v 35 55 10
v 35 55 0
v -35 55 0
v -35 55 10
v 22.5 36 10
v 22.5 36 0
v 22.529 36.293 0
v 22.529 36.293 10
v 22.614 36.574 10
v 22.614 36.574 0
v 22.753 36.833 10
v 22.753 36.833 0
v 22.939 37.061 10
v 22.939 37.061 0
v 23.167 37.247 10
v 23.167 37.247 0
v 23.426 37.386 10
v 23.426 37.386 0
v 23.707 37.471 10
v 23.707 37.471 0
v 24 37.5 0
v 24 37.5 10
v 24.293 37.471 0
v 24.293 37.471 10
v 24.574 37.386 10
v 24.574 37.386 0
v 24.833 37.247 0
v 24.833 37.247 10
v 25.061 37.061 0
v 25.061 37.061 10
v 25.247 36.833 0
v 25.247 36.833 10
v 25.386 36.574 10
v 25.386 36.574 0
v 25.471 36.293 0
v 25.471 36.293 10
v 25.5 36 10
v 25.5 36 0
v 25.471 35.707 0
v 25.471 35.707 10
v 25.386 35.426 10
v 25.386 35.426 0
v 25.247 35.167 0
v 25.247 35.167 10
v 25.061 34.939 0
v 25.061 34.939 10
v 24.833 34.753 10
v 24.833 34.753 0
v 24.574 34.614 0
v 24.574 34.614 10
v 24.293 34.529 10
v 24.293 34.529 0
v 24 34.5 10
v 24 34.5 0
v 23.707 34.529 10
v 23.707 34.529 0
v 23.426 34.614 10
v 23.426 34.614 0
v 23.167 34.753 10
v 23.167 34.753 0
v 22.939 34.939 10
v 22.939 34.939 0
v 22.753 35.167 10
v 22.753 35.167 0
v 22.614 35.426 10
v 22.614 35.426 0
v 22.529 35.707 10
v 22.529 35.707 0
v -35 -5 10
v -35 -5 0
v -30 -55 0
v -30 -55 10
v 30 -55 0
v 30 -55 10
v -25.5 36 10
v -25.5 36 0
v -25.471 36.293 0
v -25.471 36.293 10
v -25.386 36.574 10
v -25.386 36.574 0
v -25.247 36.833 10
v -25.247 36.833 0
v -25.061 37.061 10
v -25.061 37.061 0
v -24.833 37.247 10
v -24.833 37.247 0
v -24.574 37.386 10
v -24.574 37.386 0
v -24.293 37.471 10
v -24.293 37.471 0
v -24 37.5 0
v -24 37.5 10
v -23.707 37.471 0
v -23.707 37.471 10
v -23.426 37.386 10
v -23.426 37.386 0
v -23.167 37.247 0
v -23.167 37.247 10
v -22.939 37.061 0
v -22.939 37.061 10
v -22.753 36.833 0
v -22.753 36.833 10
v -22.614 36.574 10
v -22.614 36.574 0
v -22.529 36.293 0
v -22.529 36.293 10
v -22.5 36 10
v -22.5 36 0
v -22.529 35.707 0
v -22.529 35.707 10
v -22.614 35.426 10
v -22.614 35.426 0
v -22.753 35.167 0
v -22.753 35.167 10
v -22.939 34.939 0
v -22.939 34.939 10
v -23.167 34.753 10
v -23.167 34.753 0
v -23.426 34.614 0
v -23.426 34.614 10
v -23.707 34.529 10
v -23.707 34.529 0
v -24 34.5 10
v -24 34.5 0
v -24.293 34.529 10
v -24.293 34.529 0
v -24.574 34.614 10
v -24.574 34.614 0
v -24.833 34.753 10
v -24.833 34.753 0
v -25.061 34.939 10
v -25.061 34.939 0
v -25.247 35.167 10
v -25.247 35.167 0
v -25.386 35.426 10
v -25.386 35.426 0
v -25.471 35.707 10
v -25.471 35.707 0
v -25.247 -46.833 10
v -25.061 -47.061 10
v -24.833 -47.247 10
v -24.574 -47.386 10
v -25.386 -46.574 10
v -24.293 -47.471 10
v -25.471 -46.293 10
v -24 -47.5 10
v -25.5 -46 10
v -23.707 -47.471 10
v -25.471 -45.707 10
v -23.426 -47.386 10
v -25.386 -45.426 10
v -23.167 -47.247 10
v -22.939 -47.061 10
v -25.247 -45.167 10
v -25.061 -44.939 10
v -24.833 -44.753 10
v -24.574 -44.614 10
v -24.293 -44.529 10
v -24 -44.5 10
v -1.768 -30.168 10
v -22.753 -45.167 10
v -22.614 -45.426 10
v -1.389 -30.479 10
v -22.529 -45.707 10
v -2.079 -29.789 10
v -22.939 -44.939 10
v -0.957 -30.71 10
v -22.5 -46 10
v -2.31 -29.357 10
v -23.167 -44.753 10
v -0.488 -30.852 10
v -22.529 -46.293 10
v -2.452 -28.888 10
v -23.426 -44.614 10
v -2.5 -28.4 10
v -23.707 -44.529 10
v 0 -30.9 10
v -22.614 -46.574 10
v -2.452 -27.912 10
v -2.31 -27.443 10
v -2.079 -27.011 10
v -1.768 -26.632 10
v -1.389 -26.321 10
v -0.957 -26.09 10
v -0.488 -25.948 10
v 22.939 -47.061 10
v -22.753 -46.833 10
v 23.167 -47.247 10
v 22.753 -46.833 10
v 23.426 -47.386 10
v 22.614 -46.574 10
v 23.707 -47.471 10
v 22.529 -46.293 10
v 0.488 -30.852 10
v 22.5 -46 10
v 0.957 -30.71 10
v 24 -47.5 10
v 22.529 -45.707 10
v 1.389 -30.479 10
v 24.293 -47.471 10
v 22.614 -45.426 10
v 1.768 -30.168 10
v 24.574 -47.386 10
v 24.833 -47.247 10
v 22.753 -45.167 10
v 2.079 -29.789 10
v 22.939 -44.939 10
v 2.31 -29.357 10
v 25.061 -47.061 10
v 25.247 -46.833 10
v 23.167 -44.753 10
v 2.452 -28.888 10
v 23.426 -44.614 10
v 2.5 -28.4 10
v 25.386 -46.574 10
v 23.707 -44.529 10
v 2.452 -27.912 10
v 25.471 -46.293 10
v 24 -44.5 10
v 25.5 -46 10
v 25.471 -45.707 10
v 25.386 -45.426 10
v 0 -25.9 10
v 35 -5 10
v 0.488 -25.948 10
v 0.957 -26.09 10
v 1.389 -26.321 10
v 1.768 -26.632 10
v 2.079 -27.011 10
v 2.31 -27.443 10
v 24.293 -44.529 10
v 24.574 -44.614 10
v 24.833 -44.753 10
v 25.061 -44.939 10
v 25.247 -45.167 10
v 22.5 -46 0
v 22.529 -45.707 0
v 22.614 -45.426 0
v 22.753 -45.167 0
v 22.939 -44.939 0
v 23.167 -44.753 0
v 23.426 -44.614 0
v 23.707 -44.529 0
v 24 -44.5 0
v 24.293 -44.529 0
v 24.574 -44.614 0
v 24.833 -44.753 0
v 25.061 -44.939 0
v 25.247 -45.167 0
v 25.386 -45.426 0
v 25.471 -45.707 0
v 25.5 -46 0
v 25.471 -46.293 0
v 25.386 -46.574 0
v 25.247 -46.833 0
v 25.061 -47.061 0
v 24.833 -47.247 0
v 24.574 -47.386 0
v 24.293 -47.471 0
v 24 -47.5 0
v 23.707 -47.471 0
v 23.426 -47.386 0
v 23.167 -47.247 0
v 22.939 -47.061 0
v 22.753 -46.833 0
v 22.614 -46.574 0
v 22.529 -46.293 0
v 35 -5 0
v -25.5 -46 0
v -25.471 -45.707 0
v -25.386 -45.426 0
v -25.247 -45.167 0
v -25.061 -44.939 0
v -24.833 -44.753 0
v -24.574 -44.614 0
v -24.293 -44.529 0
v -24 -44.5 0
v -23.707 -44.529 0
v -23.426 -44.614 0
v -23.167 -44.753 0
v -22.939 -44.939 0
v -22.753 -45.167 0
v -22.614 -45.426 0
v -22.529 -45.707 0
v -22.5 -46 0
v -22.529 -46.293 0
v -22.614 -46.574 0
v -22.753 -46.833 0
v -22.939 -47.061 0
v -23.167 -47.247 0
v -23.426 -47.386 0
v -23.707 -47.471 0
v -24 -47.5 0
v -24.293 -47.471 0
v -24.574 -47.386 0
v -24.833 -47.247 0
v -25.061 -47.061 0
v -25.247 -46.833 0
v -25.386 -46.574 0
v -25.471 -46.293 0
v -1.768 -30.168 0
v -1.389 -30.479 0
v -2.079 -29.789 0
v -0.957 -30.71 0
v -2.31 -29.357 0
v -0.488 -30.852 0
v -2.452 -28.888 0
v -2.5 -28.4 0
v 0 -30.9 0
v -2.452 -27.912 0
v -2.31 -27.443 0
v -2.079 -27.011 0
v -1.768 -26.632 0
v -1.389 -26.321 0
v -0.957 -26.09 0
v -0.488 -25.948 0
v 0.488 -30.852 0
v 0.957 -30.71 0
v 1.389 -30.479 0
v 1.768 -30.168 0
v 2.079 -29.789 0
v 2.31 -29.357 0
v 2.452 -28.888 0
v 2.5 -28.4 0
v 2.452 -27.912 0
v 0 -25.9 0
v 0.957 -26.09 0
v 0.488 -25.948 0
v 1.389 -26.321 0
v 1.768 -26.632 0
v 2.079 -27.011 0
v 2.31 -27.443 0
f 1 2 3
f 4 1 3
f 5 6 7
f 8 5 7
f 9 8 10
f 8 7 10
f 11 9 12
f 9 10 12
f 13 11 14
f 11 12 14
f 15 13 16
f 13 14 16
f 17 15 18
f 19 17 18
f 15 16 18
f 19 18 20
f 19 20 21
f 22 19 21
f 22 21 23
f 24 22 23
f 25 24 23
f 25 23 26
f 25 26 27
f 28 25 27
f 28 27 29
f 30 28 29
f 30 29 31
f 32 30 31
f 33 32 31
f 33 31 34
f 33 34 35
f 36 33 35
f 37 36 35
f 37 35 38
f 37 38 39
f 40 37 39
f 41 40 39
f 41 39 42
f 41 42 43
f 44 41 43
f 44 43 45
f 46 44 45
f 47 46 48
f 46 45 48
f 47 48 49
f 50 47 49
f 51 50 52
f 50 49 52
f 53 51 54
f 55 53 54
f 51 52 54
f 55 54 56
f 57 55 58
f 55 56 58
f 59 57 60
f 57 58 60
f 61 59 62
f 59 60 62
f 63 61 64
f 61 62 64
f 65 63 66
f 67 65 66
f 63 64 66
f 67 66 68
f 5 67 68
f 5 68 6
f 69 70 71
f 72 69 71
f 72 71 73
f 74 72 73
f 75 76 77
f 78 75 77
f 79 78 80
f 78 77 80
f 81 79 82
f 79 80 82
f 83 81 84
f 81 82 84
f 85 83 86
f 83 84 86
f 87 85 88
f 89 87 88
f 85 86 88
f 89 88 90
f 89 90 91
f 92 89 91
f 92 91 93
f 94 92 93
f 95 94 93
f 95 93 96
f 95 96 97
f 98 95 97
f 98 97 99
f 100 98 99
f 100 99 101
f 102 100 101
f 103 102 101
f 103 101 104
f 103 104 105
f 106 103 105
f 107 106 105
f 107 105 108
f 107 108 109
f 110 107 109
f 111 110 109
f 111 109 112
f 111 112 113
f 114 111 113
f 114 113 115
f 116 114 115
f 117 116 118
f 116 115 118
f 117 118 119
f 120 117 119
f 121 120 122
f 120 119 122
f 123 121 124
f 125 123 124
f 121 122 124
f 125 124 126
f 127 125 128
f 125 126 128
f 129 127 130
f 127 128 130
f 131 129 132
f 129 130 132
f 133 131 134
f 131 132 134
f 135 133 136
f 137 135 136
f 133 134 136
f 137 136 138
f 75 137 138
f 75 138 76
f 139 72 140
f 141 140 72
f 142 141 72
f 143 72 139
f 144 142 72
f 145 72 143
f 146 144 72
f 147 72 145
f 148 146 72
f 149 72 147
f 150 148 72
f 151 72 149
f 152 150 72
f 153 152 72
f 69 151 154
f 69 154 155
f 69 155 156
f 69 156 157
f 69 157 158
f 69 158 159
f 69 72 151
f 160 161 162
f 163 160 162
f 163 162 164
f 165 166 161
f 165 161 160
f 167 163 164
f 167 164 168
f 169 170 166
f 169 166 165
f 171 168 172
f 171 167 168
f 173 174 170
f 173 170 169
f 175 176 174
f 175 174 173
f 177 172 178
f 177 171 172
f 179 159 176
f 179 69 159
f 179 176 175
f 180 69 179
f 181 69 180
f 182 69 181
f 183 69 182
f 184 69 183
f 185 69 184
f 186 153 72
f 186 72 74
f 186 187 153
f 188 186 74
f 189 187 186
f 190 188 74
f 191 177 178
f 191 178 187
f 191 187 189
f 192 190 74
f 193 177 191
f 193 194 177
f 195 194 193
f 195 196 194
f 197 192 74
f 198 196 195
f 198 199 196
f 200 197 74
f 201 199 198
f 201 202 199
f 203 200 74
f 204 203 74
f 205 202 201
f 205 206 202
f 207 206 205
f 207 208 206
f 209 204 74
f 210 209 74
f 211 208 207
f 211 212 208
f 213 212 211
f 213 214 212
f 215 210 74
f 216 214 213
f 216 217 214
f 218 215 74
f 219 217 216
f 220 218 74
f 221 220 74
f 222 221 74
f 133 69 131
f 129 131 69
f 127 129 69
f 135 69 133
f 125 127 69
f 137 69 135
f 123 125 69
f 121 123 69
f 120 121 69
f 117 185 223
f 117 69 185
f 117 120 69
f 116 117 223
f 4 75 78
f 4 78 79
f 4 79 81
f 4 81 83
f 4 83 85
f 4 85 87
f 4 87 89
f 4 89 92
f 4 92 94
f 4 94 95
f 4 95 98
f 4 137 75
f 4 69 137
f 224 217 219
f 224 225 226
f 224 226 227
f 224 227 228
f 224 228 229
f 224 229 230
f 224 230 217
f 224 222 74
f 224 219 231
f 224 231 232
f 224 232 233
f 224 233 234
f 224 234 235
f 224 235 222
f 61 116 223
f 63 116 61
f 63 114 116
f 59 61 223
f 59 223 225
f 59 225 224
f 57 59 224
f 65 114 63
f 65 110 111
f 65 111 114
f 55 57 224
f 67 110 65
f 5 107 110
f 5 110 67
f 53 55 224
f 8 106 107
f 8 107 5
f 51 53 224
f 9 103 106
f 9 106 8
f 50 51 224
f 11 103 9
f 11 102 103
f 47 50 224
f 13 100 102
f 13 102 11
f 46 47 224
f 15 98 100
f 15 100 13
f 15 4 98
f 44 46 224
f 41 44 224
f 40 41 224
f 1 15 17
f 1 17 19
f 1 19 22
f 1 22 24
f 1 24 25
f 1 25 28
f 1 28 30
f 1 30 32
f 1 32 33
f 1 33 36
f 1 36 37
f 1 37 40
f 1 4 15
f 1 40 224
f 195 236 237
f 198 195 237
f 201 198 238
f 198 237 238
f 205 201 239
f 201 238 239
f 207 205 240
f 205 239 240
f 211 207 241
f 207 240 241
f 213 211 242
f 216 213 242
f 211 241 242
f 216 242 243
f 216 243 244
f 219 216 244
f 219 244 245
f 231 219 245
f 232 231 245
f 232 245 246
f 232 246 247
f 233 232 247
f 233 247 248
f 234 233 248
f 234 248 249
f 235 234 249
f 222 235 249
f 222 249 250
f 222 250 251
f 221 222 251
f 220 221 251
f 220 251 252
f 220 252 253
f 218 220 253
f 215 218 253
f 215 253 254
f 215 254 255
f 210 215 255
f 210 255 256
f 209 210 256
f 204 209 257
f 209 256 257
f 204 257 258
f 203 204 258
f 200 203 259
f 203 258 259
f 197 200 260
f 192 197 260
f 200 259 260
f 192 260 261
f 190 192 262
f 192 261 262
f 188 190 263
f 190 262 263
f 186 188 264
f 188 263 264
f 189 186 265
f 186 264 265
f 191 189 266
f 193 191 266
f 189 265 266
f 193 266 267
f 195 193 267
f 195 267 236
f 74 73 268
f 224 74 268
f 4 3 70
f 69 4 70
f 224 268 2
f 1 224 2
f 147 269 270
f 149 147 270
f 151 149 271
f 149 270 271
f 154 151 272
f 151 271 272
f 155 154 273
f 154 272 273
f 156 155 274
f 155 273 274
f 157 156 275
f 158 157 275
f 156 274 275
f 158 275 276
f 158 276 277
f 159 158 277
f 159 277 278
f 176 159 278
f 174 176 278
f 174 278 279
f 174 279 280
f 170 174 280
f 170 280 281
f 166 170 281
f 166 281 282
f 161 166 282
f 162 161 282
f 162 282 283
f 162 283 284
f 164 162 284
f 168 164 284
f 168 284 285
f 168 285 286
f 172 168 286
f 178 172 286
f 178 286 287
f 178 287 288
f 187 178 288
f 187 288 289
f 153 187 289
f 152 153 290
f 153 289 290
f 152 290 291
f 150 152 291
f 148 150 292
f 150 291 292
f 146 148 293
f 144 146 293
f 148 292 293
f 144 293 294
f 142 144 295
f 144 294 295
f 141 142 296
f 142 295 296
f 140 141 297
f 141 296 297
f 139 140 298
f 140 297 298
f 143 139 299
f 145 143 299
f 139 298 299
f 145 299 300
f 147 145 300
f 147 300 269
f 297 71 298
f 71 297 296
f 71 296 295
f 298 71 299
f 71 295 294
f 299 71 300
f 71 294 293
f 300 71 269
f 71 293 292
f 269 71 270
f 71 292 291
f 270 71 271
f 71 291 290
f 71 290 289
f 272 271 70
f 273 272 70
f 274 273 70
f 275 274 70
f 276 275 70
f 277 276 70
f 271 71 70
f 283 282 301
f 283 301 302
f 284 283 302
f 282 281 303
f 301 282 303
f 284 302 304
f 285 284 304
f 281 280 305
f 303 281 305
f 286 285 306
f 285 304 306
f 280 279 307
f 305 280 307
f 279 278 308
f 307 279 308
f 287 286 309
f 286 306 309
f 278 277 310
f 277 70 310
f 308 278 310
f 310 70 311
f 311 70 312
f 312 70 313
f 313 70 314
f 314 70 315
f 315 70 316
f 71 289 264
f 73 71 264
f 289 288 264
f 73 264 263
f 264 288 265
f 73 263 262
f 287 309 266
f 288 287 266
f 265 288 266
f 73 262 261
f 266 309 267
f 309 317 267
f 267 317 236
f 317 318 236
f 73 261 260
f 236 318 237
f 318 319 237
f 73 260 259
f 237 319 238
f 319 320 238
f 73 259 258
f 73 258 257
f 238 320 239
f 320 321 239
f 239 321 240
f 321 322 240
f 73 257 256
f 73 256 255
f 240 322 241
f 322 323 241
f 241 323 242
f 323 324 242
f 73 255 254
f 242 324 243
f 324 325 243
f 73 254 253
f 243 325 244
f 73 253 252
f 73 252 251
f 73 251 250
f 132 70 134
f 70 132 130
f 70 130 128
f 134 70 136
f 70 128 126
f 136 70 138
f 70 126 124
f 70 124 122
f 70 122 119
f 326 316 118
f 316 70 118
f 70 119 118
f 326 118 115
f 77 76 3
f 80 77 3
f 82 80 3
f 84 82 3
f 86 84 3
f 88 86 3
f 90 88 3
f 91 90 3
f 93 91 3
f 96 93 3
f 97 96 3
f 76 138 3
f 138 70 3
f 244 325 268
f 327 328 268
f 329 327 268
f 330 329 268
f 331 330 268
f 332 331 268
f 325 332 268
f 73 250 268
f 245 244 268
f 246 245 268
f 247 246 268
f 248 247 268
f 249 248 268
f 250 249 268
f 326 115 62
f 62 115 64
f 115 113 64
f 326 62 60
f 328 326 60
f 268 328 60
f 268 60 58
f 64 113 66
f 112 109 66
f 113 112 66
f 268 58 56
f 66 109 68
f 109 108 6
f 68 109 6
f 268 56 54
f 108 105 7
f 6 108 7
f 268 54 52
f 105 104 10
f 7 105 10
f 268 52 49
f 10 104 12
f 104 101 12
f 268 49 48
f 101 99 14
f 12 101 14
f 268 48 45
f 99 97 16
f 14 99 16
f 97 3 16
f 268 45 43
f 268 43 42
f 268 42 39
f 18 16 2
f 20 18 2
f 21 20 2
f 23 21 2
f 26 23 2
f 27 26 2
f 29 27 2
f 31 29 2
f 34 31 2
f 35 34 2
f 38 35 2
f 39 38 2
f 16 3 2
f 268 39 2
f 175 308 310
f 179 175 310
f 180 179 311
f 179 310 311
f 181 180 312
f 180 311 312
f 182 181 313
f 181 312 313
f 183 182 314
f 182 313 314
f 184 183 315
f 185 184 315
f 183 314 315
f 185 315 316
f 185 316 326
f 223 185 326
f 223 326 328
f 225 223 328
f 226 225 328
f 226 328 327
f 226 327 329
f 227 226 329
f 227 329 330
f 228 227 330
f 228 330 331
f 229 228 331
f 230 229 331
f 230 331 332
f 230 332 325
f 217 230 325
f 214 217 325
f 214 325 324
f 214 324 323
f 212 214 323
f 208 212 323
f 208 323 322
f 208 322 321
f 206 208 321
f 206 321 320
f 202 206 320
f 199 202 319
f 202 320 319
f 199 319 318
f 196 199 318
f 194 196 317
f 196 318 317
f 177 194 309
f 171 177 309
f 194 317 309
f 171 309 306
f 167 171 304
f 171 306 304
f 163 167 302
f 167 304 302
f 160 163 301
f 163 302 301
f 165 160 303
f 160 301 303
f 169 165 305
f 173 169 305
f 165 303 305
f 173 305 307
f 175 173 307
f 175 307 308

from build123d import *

# Parameters (mm, degrees)
F1_DEPTH = 10
F3_D     = 5
F4_D     = 3


with BuildPart() as f1:
    # F0 (on Top) → F1 (new body)
    with BuildSketch(Plane.XY):
        Polygon((35, -5), (35, 55), (-35, 55), (-35, -5), (-30, -55), (30, -55), align=None)
    extrude(amount=F1_DEPTH)

    # F3 (through all)
    with Locations(Plane.XY.offset(10)):
        with Locations((0, -28.4)):
            Hole(F3_D / 2)

    # F4 (through all)
    with Locations(Plane.XY.offset(10)):
        with Locations((-24, 36), (24, 36), (24, -46), (-24, -46)):
            Hole(F4_D / 2)


solid = f1.part
